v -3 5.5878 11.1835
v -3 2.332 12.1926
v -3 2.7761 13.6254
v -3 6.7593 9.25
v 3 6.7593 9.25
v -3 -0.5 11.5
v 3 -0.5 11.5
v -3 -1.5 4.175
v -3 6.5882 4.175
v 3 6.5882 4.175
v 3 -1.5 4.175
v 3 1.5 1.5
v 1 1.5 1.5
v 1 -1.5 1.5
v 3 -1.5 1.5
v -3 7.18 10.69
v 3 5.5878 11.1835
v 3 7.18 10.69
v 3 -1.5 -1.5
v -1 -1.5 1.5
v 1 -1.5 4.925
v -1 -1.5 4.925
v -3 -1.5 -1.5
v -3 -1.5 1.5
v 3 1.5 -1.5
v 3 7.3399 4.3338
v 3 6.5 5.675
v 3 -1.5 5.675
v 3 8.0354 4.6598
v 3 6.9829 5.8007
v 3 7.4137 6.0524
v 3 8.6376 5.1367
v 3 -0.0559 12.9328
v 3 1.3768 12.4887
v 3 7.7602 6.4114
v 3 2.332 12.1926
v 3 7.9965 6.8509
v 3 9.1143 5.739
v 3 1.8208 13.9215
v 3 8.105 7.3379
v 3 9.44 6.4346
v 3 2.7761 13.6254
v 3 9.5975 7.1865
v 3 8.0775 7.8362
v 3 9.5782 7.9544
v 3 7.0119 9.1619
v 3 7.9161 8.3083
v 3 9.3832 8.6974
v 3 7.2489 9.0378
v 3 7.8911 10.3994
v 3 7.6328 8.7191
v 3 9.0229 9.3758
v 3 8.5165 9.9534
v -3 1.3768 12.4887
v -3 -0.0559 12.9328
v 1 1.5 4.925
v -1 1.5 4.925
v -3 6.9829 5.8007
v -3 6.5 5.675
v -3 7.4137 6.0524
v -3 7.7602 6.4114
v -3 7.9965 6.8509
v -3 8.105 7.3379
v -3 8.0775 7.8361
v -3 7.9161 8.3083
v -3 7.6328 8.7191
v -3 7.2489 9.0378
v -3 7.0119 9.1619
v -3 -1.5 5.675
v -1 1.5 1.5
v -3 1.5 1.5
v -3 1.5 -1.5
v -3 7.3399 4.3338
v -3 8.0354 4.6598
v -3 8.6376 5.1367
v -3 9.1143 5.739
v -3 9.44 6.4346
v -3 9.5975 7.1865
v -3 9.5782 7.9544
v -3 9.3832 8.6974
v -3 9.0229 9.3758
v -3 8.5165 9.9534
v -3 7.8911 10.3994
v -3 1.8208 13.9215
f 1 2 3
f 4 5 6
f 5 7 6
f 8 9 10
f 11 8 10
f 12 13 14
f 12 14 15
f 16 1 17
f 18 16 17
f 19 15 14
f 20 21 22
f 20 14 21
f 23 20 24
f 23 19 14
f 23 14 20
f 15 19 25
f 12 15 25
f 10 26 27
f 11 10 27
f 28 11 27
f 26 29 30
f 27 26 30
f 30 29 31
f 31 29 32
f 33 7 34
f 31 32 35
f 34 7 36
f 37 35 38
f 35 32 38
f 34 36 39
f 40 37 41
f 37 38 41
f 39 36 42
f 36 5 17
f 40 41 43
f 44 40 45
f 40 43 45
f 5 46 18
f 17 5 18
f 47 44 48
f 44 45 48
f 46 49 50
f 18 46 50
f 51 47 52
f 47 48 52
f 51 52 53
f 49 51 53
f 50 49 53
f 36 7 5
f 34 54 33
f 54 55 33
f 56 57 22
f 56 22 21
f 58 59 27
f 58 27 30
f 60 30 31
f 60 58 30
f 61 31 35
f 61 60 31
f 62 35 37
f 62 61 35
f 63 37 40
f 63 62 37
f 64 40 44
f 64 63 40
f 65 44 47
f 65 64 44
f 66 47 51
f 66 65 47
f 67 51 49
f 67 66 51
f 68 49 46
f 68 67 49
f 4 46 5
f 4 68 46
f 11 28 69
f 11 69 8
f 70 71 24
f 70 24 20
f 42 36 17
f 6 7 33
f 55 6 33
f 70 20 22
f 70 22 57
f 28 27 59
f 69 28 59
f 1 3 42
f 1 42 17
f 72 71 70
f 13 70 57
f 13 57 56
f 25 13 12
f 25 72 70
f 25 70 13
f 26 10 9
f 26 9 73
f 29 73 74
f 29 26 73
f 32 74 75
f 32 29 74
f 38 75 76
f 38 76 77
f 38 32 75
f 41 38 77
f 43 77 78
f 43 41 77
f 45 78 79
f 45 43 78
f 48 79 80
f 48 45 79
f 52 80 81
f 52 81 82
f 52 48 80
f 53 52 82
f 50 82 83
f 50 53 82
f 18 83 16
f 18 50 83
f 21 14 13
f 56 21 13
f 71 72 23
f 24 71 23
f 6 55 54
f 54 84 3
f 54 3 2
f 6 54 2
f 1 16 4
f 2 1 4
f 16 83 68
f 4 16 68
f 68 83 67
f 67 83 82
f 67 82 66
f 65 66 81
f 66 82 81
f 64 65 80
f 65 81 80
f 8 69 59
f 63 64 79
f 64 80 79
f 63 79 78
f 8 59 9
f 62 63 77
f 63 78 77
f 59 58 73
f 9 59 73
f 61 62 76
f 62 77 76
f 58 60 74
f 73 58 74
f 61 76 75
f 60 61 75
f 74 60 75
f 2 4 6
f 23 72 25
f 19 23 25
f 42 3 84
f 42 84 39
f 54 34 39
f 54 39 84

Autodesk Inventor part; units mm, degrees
ref_plane "YZ Plane" through (0, 0, 0) normal (1, 0, 0) x (0, 1, 0)
ref_plane "XZ Plane" through (0, 0, 0) normal (0, 1, 0) x (-1, 0, 0)
ref_plane "XY Plane" through (0, 0, 0) normal (0, 0, 1) x (1, 0, 0)
sketch "Sketch6" plane through (0, 0, 0) normal (0, 0, 1) x (1, 0, 0)
  line L0 (3, -1.5) -> (3, 1.5)
  line L1 (3, 1.5) -> (-3, 1.5)
  line L2 (-3, 1.5) -> (-3, -1.5)
  line L3 (-3, -1.5) -> (3, -1.5)
  line L4 (3, -1.5) -> (-3, 1.5) construction
  line L5 (3, 1.5) -> (-3, -1.5) construction
  point P0 (0, 0)
  dimension "d11" = 3
  dimension "d12" = 6
extrude "Extrusion4" add sketch "Sketch6" along normal mid plane 3
ref_plane "Work Plane1" through (0, 0, 0) normal (0, 0, 1) x (1, 0, 0)
sketch "Sketch8" plane through (0, 0, 1.5) normal (0, 0, 1) x (1, 0, 0)
  line L0 (-1, -1.5) -> (-1, 1.5)
  line L1 (-1, 1.5) -> (1, 1.5)
  line L2 (1, 1.5) -> (1, -1.5)
  line L3 (1, -1.5) -> (-1, -1.5)
  line L4 (-1, -1.5) -> (1, 1.5) construction
  line L5 (-1, 1.5) -> (1, -1.5) construction
  line L6 (3, 1.5) -> (-3, 1.5) projected
  point P0 (0, 0)
  dimension "d19" = 3
  dimension "d20" = 2
extrude "Extrusion6" add sketch "Sketch8" along normal blind 1.5
ref_plane "Work Plane4" through (-3, 0, -1.5) normal (0, 1, 0) x (1, 0, 0)
ref_plane "Work Plane5" through (0, -1.5, 1.5) normal (-1, 0, 0) x (0, 0, 1)
sketch "Sketch9" plane through (0, 0, 3) normal (0, 0, 1) x (1, 0, 0)
  point P0 (0, 0)
sketch "Sketch10" plane through (0, -1.5, 1.5) normal (-1, 0, 0) x (0, 0, 1)
  point P0 (-1.5, 1.5)
sketch "Sketch11" plane through (0, 0, 3) normal (0, 0, 1) x (1, 0, 0)
  point P0 (0, 0)
sketch "Sketch12" plane through (0, -1.5, 1.5) normal (-1, 0, 0) x (0, 0, 1)
  point P0 (-1.5, 1.5)
sketch "Sketch13" plane through (0, -1.5, 1.5) normal (-1, 0, 0) x (0, 0, 1)
  point P0 (-1.5, 1.5)
sketch "Sketch15" plane through (0, -1.5, 1.5) normal (-1, 0, 0) x (0, 0, 1)
  line L0 (4.175, 0) -> (4.175, 8)
  arc A0 (7.75, 8.2593) -> (4.175, 8) centre (5.9874, 7.7861) ccw
  line L1 (7.75, 8.2593) -> (10, 1)
  line L2 (0, 0) -> (1.5, 0) projected
  line L3 (1.5, 0) -> (6.1638, 0) construction
  line L4 (1.5, 3) -> (1.5, 0) projected
  point P0 (-1.5, 1.5)
  dimension "d31" = 8
  dimension "d34" = 7.6
  dimension "d41" = 2.675
  dimension "d48" = 3.575
sketch "Sketch18" plane through (-3, -1.5, -1.5) normal (0, -1, 0) x (1, 0, 0)
  line L0 (6, 5.675) -> (0, 5.675)
  line L1 (0, 5.675) -> (0, 7.175)
  line L2 (0, 7.175) -> (6, 7.175)
  line L3 (6, 7.175) -> (6, 5.675)
  line L4 (6, 5.675) -> (0.1205, 6.5404) construction
  line L5 (0, 5.675) -> (6, 7.175) construction
  line L6 (2, 4.5) -> (4, 4.5) projected
  point P0 (3, 1.5)
  point P1 (2.2234, 6.2309)
  point P2 (3, 4.5)
  point P3 (3, 4.5)
  point P4 (3, 7.175)
  point P5 (3, 7.175)
  dimension "d37" = 6
  dimension "d38" = 1.5
  dimension "d42" = 0
sweep "Sweep1" add profiles "Sketch18" path "Sketch15" separate body path curves L0 A0 L1
sketch "Sketch19" plane through (-3, 7.8131, 10.4938) normal (0, 0.2960526, 0.9551716) x (1, 0, 0)
  line L0 (0, -7.469) -> (0, 0.1723) projected
  line L1 (6, -0.6384) -> (6, -8.2384) projected
  line L2 (0, -5.7384) -> (6, -5.7384)
  line L3 (6, -5.7384) -> (6, -6.7384)
  line L4 (6, -6.7384) -> (0, -6.7384)
  line L5 (0, -6.7384) -> (0, -5.7384)
  line L6 (6, -8.2384) -> (0, -8.2384) projected
  point P0 (3, -4.3562)
  point P1 (0, -6.7384)
  point P2 (6, -5.7384)
  point P3 (0, -6.7384)
  dimension "d49" = 1.5
  dimension "d50" = 1
extrude "Extrusion7" add sketch "Sketch19" along normal blind 1.5 bodies 2
sketch "Sketch20" plane through (-3, -1.5, 4.175) normal (-1, 0, 0) x (0, 0, 1)
  line L0 (8.0176, 3.832) -> (9.4504, 4.2761) projected
  line L1 (9.4504, 4.2761) -> (7.0085, 7.0878)
  line L2 (6.515, 8.6801) -> (8.0176, 3.832) projected
  point P0 (-4.175, 1.5)
extrude "Extrusion8" add sketch "Sketch20" against normal blind 6 bodies 2
sketch "Sketch21" plane through (0, 0, 3) normal (0, 0, 1) x (1, 0, 0)
  line L0 (-1, 1.5) -> (-3, 1.5) projected
  line L1 (1, -1.5) -> (1, 1.5) projected
  line L2 (-1, 1.5) -> (1, 1.5)
  line L3 (1, 1.5) -> (1, -1.5)
  line L4 (1, -1.5) -> (-1, -1.5)
  line L5 (-1, -1.5) -> (-1, 1.5)
  point P0 (0, 0)
extrude "Extrusion9" add sketch "Sketch21" along normal blind 1.925 bodies 1
equation "\"d11\" = PCB_thickness"
equation "\"d12\" = clipper_uppter_t_length"
equation "\"d13\" = 0.5 * wall_thickness"
equation "\"d19\" = PCB_thickness"
equation "\"d20\" = clipp_lower_t_part_thickness"
equation "\"d21\" = 0.25 * wall_thickness"
equation "\"d31\" = arm_heigth"
equation "\"d34\" = 0.95 * arm_heigth"
equation "\"d41\" = 0.5 * spring_thickness + 0.35 * gap_width"
equation "\"d48\" = 0.65 * gap_width"
equation "\"d37\" = spring_width"
equation "\"d38\" = spring_thickness"
equation "\"d49\" = hook_offset"
equation "\"d46\" = spring_width"
equation "\"d51\" = 0.35 * gap_width"
equation "\"wall_thickness\" = 6"
equation "\"PCB_thickness\" = 3"
equation "\"clipp_lower_t_part_thickness\" = 2"
equation "\"clipper_uppter_t_length\" = 6"
equation "\"arm_heigth\" = 8"
equation "\"arc_radius\" = 1.3"
equation "\"gap_width\" = 5.5"
equation "\"spring_thickness\" = 1.5"
equation "\"spring_width\" = 6"
equation "\"hook_length\" = 3"
equation "\"hook_offset\" = 1.5"
properties part number "Clipper"
